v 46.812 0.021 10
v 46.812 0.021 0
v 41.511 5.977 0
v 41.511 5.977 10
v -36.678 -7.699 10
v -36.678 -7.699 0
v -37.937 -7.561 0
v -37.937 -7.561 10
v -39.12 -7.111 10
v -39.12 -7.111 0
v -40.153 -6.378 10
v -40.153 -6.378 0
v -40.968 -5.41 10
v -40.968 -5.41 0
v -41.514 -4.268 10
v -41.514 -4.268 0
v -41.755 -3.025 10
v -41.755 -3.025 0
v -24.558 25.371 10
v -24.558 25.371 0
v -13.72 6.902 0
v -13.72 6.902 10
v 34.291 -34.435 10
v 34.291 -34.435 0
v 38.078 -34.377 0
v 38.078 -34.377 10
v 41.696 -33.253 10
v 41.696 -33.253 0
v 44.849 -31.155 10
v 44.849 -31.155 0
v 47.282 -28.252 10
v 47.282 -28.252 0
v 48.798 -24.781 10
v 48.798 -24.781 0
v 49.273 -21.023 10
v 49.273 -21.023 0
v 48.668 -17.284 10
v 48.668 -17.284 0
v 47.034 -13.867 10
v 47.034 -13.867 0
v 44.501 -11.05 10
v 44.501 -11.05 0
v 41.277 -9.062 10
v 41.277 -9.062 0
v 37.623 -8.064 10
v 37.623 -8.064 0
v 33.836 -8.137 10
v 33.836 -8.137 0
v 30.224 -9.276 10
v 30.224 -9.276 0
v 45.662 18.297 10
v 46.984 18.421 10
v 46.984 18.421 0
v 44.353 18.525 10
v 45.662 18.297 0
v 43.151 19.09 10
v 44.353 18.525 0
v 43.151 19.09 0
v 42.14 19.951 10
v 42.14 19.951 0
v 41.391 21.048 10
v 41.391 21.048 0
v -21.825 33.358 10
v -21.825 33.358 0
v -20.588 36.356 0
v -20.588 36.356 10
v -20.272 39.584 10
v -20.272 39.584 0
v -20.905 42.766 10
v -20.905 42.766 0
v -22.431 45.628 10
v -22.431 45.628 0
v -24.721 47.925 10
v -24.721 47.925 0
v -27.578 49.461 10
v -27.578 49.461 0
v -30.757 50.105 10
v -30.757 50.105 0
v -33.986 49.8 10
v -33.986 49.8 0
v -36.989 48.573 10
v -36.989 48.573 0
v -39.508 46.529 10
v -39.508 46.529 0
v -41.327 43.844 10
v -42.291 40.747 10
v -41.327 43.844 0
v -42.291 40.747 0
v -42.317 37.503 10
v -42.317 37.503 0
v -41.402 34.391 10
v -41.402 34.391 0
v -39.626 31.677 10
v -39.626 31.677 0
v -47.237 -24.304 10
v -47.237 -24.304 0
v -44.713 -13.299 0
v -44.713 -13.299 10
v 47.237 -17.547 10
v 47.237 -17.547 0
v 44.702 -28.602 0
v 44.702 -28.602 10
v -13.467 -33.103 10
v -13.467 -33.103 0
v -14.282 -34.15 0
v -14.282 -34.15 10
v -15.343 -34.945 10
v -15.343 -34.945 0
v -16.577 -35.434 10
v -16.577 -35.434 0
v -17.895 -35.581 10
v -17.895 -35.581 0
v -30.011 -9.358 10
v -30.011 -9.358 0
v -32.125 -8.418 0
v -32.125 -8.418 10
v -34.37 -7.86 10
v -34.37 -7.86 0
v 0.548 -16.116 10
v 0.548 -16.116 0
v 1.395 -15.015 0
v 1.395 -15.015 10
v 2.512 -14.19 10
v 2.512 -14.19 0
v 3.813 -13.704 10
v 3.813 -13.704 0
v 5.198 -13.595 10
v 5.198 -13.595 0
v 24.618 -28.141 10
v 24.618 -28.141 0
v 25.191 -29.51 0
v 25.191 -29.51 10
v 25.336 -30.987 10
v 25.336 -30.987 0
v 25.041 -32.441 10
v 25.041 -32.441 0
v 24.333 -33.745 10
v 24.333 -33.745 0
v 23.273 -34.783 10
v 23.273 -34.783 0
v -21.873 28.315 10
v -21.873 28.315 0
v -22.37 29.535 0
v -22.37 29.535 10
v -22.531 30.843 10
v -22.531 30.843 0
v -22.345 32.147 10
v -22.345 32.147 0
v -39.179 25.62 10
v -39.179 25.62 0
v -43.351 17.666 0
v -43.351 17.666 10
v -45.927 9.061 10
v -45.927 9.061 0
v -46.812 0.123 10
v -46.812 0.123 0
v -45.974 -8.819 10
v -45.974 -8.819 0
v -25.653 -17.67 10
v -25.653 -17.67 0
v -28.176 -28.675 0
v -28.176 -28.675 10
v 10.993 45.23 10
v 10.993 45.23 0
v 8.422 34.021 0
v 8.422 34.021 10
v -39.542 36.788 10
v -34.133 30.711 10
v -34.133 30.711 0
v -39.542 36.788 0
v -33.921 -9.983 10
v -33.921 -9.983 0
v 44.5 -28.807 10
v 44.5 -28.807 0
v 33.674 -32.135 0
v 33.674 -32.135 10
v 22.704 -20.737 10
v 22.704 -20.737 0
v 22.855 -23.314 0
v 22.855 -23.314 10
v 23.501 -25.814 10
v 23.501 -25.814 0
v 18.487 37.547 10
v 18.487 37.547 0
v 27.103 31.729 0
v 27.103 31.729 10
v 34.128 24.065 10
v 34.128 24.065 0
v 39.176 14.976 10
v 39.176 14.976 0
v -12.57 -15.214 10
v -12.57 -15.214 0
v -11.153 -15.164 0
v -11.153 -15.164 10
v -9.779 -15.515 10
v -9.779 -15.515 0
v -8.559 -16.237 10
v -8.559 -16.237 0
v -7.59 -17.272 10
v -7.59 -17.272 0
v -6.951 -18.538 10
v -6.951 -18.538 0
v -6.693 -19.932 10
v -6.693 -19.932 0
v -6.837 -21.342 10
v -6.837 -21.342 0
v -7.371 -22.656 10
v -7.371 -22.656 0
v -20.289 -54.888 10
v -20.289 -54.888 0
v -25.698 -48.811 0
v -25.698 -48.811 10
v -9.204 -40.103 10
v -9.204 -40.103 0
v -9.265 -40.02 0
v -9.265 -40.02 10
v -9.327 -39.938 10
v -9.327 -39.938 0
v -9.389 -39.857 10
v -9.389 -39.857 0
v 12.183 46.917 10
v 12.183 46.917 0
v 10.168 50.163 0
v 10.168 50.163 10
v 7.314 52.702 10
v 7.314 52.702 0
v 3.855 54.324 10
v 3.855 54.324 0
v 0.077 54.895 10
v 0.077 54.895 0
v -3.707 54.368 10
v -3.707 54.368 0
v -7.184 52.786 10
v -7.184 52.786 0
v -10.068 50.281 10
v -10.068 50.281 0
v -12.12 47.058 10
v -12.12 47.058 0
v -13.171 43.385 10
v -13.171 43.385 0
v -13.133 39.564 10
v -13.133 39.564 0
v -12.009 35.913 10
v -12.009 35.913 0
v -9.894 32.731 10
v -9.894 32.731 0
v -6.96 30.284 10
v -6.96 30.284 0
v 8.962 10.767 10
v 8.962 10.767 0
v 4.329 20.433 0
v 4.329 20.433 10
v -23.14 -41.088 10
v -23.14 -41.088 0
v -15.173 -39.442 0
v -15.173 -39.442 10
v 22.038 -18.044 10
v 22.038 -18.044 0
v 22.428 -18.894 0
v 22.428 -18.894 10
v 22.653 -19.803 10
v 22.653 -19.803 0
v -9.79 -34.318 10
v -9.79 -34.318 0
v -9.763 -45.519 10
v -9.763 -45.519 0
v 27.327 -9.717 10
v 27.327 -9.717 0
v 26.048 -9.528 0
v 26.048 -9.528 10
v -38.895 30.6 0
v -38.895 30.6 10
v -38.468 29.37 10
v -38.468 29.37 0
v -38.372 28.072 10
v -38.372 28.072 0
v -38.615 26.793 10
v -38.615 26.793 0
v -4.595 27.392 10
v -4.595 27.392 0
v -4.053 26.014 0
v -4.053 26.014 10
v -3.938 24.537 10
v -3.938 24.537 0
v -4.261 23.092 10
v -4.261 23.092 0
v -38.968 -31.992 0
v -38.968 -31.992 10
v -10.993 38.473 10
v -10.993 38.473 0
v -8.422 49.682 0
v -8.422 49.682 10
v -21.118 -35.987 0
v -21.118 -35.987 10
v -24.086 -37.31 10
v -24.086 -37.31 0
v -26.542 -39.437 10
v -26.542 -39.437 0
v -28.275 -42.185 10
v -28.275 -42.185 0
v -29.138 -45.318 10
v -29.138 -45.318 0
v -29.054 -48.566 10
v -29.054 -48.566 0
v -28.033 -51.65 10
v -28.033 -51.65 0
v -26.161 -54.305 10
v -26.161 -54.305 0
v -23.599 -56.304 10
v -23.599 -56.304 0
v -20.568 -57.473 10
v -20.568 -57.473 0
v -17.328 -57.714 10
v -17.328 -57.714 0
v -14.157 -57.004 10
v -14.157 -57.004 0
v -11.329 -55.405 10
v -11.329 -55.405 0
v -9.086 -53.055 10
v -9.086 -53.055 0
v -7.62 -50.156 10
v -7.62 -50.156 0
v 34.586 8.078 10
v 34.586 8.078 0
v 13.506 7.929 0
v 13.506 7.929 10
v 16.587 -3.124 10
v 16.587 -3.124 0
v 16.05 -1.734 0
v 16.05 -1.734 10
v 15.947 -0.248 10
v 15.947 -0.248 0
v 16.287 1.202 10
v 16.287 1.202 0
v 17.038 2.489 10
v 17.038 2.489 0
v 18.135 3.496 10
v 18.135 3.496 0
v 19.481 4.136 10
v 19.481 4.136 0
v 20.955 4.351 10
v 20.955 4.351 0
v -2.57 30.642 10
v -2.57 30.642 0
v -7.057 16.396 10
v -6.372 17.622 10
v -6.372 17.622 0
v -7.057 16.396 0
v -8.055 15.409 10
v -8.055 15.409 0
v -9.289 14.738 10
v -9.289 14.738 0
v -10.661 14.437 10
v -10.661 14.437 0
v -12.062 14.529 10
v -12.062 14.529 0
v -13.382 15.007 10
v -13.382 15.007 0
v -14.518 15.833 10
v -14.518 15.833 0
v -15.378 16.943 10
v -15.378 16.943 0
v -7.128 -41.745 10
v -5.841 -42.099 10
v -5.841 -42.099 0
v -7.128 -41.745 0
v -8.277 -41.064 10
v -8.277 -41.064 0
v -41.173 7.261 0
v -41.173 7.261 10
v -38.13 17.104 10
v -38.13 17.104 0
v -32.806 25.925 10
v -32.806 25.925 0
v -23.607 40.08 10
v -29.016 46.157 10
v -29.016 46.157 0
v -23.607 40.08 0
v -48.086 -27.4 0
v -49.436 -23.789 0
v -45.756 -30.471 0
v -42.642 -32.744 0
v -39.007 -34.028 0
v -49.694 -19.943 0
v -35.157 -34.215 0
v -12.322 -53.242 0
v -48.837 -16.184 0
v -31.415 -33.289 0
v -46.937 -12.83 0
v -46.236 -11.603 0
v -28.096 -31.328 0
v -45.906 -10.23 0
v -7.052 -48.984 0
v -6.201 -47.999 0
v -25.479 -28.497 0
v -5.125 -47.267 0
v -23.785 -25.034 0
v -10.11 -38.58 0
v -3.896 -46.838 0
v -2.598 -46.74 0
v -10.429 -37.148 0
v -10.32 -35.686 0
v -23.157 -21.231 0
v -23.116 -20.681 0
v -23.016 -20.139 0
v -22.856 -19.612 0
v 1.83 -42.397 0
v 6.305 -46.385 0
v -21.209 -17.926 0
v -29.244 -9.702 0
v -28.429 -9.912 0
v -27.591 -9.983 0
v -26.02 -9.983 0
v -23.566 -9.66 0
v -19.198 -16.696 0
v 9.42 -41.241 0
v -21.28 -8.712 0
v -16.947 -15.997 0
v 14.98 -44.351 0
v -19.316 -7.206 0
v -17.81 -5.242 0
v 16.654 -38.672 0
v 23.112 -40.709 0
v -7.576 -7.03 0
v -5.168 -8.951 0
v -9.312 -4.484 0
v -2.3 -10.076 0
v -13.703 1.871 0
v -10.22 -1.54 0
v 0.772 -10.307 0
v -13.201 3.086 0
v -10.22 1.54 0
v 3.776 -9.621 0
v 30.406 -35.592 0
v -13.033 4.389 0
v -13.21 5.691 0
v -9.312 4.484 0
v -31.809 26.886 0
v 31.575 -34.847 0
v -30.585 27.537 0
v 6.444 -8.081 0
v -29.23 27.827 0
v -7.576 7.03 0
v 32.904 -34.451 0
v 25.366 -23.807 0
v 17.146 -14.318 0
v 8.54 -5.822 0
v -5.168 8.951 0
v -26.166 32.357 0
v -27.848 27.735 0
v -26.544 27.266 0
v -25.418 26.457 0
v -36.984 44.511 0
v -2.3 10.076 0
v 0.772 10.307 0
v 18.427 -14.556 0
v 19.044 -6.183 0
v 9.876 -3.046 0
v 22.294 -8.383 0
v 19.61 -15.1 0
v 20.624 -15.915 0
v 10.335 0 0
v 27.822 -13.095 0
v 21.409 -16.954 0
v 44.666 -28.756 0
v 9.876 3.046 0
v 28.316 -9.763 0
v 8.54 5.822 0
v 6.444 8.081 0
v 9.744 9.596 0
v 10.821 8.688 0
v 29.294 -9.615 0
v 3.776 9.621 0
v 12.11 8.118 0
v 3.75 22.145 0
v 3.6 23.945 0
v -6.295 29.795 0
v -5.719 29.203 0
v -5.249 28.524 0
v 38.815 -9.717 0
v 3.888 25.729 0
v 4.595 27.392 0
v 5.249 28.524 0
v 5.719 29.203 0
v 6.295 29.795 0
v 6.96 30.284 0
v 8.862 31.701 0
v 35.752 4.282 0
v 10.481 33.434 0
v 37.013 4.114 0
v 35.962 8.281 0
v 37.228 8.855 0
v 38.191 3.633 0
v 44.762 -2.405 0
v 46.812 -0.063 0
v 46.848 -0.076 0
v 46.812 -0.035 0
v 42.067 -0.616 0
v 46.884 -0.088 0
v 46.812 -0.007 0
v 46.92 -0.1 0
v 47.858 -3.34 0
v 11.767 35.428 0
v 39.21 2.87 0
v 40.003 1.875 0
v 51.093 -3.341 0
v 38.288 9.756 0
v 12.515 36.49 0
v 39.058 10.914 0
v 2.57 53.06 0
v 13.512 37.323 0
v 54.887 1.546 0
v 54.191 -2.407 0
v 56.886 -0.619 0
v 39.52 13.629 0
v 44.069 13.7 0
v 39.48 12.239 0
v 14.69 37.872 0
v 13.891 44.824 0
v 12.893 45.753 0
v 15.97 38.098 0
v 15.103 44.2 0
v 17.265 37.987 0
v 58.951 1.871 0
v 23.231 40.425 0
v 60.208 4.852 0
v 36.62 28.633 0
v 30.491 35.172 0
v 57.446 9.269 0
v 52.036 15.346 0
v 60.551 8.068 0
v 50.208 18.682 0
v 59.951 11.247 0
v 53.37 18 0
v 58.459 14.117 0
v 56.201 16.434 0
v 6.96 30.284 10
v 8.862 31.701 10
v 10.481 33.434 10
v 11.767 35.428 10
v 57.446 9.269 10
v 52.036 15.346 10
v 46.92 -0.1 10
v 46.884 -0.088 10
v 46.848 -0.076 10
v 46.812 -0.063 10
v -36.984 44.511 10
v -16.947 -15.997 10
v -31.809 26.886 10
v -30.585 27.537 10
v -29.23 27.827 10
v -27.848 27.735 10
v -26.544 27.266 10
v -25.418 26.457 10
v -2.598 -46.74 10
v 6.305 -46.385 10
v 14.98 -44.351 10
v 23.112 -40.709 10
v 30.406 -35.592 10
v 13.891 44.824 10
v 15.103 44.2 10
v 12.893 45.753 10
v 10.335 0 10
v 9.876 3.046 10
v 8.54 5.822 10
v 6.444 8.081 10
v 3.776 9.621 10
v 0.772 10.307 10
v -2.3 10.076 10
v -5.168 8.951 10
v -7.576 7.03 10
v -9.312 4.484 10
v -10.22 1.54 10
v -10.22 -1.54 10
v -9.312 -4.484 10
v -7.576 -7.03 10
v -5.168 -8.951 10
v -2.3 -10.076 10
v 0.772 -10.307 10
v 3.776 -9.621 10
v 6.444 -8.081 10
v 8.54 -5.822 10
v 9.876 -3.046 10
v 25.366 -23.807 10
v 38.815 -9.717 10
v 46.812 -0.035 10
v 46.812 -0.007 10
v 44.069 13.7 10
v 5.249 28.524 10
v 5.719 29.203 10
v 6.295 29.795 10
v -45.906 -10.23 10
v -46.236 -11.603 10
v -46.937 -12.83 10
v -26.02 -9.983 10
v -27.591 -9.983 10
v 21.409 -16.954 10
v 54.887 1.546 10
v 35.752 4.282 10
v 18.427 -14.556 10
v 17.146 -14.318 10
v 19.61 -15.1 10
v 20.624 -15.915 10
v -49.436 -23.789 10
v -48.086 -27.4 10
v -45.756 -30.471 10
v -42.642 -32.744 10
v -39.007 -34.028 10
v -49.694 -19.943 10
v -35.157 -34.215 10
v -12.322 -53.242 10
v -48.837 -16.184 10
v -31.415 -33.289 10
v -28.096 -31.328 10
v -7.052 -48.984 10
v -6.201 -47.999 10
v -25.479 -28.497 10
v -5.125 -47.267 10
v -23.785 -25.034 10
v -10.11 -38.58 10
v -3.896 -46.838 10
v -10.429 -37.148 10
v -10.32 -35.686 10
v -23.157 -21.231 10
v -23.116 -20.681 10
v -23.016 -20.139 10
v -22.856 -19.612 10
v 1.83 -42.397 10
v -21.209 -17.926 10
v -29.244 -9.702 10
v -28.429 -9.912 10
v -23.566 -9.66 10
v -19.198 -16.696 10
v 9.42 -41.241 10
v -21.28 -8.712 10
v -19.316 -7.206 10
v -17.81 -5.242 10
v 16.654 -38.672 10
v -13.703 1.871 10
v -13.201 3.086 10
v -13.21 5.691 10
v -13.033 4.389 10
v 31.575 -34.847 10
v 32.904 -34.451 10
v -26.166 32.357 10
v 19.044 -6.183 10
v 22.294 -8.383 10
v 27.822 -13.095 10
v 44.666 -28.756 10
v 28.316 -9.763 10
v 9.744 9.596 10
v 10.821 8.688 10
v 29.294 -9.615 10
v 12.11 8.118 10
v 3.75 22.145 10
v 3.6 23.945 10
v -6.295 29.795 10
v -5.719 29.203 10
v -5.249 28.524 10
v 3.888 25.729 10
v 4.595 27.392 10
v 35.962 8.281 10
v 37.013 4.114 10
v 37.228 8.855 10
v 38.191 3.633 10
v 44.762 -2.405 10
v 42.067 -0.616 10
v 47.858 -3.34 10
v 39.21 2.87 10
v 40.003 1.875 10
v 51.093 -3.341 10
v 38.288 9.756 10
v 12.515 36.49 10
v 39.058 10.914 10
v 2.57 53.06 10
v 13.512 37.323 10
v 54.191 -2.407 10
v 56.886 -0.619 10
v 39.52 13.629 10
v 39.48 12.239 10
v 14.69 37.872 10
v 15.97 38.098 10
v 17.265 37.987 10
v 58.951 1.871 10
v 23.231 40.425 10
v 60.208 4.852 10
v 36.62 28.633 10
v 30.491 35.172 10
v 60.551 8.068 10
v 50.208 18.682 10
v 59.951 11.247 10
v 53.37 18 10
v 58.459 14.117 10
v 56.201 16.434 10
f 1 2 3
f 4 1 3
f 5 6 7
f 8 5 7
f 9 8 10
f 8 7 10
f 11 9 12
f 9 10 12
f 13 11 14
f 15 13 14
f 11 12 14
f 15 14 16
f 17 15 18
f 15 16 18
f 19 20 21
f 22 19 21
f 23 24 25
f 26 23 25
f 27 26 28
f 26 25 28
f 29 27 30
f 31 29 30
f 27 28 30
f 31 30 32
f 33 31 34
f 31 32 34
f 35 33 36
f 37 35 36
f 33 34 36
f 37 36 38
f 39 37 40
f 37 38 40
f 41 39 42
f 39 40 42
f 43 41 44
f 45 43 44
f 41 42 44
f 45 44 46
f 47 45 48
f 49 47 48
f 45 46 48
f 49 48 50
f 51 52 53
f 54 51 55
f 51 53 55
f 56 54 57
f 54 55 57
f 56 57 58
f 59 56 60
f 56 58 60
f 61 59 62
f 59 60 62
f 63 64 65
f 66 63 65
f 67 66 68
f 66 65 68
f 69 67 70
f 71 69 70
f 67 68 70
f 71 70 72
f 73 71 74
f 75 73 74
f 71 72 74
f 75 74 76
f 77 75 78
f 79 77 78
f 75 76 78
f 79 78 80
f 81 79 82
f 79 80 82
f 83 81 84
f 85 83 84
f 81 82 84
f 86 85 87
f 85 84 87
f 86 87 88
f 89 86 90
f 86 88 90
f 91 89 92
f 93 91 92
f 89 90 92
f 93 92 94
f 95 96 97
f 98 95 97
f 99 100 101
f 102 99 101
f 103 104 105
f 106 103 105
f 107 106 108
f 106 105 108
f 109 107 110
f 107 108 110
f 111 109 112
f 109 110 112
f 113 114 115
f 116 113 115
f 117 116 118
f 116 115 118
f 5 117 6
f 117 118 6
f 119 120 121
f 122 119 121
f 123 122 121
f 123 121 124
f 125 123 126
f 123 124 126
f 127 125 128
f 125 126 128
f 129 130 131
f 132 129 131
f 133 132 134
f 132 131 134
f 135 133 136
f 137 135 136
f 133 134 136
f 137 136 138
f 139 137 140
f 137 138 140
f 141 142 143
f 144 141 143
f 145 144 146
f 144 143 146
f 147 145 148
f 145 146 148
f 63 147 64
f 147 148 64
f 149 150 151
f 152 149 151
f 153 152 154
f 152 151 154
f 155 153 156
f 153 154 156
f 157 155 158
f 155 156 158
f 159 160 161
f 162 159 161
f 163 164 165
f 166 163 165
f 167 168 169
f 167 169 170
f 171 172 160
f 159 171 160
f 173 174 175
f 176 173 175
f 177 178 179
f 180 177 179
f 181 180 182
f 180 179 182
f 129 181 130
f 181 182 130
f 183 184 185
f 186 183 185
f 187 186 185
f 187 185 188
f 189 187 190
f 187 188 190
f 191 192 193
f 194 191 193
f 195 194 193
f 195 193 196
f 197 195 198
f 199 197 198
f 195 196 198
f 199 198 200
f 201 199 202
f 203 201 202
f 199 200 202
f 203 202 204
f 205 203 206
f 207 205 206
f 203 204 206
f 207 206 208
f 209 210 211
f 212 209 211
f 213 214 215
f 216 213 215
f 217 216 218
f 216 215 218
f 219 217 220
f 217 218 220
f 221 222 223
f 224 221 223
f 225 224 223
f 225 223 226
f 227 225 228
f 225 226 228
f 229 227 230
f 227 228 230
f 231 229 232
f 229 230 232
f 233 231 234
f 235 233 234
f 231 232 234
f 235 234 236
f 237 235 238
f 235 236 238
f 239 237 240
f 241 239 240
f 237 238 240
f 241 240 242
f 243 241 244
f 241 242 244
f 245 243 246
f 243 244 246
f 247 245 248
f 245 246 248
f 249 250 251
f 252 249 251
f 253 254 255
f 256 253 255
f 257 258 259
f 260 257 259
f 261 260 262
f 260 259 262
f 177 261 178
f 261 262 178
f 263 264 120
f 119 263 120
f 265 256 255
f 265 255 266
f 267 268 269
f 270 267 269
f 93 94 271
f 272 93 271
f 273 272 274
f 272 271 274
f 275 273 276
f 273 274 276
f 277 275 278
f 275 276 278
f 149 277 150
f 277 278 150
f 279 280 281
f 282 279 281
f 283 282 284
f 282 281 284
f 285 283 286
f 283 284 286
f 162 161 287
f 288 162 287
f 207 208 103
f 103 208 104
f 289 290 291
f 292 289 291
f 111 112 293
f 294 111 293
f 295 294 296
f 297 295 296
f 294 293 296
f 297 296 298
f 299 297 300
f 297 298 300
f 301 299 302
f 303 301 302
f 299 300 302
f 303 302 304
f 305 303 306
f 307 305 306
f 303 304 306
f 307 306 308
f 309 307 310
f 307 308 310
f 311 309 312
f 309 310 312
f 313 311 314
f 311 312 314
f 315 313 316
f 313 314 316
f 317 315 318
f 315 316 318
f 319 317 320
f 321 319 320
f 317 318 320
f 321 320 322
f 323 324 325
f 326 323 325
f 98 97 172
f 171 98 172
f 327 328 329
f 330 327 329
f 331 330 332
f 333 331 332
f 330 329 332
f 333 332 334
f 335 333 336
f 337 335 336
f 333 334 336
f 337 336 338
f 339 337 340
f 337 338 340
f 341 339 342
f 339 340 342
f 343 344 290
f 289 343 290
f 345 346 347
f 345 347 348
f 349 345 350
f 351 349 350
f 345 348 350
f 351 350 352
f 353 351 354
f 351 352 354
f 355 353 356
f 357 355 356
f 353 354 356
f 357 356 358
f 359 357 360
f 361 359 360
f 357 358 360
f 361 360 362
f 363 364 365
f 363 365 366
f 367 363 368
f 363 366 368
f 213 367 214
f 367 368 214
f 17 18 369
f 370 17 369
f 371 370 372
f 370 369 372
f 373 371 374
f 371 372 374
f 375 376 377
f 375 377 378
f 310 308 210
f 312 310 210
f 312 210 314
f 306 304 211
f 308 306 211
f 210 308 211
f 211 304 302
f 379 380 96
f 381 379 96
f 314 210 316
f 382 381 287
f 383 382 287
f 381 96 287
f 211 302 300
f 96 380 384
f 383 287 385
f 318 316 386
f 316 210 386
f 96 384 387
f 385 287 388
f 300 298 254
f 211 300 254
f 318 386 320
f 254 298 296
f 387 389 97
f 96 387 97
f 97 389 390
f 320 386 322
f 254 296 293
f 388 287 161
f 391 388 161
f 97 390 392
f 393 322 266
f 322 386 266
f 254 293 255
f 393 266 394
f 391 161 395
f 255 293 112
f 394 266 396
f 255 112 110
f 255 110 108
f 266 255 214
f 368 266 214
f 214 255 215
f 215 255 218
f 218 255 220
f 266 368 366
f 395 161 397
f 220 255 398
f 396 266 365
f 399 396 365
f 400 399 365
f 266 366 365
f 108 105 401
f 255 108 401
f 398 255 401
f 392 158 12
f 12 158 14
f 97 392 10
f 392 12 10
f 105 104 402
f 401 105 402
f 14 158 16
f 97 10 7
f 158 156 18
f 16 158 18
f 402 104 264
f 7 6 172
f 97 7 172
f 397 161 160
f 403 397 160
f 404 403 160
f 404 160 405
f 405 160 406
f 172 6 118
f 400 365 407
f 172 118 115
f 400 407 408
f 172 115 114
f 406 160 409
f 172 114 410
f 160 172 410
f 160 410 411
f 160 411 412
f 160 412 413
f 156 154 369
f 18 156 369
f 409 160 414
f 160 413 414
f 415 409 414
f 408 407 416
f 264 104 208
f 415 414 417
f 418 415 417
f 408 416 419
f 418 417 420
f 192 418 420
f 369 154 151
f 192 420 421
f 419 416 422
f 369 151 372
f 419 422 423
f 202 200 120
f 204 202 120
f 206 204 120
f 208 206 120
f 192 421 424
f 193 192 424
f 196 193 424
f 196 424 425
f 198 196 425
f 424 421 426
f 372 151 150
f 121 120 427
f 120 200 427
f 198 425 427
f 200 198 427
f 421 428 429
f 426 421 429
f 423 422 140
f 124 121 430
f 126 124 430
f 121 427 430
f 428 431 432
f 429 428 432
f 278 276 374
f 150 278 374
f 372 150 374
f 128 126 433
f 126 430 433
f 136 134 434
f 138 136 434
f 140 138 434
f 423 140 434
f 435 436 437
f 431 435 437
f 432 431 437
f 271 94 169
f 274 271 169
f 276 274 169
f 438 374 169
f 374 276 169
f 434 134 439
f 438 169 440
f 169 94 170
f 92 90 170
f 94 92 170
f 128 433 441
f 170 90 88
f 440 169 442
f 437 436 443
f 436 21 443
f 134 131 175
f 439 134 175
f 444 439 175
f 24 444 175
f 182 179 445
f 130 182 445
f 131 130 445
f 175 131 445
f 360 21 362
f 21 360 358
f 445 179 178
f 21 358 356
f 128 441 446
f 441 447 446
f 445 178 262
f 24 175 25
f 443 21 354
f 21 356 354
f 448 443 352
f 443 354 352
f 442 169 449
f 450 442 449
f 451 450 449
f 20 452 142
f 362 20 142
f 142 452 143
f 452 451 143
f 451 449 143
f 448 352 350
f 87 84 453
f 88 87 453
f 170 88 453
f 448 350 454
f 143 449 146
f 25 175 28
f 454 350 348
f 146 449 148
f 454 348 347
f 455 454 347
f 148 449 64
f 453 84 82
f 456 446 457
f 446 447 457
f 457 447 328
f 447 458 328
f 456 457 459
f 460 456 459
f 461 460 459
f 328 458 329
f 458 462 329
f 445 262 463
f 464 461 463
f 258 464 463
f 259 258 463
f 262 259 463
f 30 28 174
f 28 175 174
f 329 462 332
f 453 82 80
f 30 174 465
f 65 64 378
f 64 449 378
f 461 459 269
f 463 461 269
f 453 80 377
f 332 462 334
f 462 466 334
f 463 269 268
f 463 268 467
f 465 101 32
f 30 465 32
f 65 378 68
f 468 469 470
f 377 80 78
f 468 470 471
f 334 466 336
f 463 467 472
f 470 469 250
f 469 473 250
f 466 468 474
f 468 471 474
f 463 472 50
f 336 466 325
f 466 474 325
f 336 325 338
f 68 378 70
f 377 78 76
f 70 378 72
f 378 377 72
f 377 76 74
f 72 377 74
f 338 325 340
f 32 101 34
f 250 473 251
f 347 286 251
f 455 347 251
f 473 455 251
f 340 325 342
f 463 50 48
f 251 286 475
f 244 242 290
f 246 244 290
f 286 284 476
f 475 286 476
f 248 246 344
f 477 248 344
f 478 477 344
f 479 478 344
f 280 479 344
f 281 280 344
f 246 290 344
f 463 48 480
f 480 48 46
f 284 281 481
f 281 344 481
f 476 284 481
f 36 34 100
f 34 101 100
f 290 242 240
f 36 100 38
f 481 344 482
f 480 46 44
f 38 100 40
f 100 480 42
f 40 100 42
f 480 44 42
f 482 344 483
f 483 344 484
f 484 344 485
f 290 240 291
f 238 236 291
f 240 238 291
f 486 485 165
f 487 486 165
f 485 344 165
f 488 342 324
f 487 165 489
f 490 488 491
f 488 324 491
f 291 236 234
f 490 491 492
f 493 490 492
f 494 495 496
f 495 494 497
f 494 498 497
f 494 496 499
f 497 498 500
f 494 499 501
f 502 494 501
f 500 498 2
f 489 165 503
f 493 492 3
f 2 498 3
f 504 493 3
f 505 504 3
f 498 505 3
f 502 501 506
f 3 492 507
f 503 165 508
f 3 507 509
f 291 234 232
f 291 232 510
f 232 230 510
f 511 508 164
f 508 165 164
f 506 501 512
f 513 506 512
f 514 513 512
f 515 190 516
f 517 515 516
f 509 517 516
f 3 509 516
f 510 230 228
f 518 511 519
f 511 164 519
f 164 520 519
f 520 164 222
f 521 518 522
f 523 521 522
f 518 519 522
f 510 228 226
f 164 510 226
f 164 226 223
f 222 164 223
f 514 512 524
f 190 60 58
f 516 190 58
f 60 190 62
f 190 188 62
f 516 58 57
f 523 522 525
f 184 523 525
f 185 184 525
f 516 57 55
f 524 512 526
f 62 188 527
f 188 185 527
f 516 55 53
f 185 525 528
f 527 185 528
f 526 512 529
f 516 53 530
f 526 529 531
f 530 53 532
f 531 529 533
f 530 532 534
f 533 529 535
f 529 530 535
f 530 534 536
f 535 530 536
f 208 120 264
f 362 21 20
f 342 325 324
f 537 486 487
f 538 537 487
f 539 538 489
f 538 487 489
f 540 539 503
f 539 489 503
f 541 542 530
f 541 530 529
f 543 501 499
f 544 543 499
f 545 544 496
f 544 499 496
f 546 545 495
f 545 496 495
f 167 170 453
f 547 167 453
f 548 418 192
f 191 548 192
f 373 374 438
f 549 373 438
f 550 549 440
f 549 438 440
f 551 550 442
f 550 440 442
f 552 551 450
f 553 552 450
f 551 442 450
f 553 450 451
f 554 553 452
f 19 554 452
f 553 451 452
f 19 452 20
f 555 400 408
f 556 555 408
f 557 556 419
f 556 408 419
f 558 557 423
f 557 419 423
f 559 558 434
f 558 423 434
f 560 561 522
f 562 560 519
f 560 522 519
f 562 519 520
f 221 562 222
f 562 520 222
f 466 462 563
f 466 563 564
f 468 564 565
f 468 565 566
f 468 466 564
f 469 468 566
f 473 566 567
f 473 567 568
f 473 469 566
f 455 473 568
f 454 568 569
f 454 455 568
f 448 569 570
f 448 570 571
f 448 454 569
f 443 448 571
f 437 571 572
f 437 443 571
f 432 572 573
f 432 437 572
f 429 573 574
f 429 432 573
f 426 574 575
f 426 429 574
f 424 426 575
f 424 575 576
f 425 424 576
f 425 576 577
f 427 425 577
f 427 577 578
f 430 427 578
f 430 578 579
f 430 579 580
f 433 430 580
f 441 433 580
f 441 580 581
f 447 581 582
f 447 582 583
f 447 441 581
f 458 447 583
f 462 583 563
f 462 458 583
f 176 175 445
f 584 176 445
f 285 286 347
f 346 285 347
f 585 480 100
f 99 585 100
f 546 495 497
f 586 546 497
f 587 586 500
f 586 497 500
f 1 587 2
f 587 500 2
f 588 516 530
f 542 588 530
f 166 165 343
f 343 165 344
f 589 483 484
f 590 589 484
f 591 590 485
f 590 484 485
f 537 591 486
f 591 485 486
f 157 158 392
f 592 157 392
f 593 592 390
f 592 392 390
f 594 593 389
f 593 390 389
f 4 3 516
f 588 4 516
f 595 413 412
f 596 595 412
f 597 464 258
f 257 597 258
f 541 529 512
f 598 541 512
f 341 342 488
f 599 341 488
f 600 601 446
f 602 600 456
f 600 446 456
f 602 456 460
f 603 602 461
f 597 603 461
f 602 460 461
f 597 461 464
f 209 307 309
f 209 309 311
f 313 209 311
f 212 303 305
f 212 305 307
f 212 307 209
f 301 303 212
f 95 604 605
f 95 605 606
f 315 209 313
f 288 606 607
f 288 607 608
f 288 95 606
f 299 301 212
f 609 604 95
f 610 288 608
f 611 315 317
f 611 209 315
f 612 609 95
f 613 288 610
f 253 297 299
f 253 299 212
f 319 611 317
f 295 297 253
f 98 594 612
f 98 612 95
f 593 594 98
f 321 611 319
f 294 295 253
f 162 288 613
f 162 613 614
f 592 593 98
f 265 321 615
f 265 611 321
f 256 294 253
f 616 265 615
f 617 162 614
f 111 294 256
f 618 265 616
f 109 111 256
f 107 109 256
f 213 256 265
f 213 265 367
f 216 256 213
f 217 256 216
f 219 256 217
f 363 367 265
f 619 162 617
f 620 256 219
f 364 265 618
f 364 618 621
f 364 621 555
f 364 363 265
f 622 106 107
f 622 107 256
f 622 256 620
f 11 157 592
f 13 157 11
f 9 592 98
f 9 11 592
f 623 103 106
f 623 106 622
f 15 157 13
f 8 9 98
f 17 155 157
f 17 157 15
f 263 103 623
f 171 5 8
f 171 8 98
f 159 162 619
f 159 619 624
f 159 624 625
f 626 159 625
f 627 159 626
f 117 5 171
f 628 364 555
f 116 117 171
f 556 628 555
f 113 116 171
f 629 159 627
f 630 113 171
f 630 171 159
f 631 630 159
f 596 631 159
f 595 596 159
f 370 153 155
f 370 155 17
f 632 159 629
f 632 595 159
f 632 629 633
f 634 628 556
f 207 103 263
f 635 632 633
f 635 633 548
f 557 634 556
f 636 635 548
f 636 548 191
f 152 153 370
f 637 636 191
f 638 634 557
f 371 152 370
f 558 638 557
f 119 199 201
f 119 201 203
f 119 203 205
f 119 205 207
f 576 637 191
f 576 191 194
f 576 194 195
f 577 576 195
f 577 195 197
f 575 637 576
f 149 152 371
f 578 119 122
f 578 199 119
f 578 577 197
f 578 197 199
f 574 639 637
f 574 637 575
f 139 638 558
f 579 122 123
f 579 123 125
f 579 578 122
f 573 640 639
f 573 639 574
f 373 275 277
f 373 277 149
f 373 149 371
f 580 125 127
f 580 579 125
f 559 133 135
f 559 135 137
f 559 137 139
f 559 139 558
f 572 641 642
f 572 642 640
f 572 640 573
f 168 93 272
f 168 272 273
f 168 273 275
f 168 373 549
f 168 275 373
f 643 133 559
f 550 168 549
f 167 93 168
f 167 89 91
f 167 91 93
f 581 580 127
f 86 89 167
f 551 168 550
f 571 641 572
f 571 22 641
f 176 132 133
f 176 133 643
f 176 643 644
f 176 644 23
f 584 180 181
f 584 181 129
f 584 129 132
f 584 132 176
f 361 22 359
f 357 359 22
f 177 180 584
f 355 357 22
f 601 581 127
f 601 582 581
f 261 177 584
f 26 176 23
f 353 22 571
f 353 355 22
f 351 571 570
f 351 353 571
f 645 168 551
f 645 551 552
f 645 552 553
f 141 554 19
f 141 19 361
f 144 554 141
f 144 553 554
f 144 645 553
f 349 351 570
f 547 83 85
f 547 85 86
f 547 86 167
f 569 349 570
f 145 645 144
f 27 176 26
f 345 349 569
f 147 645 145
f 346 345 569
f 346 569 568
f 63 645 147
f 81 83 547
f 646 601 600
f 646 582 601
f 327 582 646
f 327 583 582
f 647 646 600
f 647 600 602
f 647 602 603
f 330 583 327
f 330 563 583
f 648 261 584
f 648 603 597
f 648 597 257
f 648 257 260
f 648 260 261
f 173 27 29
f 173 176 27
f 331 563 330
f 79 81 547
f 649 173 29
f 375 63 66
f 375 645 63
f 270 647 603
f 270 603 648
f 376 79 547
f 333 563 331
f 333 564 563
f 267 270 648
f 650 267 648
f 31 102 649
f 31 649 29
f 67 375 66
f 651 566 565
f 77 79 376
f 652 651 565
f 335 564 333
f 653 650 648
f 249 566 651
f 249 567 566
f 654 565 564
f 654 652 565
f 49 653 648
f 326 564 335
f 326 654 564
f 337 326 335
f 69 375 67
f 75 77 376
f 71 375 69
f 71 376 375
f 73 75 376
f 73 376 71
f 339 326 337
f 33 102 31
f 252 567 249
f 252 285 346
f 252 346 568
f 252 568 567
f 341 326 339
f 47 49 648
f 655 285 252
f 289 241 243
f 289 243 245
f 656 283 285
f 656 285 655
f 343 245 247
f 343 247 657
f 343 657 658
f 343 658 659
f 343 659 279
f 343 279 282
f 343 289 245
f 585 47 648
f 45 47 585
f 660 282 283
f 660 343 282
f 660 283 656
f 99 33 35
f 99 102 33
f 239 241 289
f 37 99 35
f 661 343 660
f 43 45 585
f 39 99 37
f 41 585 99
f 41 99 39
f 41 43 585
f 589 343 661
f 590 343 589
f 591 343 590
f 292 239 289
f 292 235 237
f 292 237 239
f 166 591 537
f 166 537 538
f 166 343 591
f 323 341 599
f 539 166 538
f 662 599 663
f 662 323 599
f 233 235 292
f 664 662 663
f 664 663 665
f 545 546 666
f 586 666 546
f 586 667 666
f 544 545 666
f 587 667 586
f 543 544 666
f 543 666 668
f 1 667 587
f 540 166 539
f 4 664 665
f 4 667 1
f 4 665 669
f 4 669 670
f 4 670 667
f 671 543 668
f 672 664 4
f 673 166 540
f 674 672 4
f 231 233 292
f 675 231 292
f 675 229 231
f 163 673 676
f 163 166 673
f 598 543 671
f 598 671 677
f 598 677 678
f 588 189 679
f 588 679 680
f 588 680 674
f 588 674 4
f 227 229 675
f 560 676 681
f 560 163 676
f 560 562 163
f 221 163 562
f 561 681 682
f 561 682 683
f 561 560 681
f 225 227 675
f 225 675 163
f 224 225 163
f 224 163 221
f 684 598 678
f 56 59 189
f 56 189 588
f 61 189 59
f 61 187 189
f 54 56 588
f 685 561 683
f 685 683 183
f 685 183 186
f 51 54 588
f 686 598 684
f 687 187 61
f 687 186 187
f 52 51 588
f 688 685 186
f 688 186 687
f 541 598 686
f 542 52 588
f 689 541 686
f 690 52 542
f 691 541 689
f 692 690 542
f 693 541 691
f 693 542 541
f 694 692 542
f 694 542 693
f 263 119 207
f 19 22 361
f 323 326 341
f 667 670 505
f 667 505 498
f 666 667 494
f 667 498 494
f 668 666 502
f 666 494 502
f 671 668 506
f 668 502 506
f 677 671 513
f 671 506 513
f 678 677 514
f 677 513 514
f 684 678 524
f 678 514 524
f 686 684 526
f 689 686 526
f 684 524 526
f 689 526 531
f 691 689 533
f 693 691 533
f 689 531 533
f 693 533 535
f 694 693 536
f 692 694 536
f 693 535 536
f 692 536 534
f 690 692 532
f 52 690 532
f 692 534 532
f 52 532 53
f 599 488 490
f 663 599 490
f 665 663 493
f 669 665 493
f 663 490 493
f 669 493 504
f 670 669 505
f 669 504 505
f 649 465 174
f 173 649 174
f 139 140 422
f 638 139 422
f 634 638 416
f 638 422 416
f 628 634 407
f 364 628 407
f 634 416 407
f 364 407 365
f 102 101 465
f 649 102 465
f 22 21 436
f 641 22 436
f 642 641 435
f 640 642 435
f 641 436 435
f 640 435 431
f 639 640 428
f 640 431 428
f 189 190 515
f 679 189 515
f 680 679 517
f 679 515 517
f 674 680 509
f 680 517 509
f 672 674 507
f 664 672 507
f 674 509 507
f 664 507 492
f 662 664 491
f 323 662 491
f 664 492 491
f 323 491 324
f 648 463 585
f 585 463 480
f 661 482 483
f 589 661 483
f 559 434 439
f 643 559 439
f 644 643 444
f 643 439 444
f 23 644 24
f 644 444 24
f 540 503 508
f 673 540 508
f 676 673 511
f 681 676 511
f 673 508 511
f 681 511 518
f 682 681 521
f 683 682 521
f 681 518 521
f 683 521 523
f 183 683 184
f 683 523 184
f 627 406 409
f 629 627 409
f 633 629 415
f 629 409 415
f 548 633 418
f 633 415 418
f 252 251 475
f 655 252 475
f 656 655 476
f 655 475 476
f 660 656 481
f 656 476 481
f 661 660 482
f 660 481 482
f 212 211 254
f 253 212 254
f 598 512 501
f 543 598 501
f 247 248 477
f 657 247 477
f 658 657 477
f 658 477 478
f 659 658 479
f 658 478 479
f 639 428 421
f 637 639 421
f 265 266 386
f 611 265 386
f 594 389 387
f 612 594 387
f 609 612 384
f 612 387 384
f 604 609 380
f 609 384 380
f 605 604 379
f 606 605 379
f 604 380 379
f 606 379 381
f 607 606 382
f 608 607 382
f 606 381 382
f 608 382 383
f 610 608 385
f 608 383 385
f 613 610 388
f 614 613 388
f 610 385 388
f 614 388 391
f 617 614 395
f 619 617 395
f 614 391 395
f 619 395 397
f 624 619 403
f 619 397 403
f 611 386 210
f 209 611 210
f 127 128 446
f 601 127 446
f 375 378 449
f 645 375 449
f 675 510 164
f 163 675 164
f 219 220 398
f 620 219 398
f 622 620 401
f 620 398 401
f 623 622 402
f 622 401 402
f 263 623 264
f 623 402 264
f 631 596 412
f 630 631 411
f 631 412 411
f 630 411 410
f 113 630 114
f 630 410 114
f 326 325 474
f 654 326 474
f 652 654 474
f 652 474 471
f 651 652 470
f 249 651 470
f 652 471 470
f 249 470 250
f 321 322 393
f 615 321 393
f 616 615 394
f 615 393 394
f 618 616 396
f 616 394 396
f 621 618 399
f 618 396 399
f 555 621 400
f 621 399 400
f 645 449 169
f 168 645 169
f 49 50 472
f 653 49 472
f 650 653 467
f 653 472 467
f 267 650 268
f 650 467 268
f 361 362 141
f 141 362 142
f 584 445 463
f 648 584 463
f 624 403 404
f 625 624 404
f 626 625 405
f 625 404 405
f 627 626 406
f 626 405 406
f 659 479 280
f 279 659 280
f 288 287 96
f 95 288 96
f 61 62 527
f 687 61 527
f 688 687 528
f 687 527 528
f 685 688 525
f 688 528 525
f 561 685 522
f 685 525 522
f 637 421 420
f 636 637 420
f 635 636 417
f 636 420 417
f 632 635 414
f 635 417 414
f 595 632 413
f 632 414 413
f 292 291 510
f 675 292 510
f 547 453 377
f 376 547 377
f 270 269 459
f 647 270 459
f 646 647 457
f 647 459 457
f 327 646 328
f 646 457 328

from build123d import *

# Parameters (mm, degrees)
F0_R     = 10.3354497049
F1_DEPTH = 10


with BuildPart() as f1:
    # F0 (on Top) → F1 (new body)
    with BuildSketch(Plane.XY):
        with BuildLine():
            ThreePointArc((26.0476715205, -9.5277688633), (20.5866821195, -7.4048691039), (16.5865343387, -3.1237563563))
            ThreePointArc((16.5865343387, -3.1237563563), (16.6143313263, 1.8736112558), (20.9546162977, 4.350783452))
            Line((20.9546162977, 4.350783452), (35.7516345046, 4.2815737703))
            ThreePointArc((35.7516345046, 4.2815737703), (38.1912718914, 3.6328944013), (40.0030732107, 1.875057241))
            ThreePointArc((40.0030732107, 1.875057241), (59.6888453726, 3.3154186125), (46.9838539695, 18.4212936265))
            ThreePointArc((46.9838539695, 18.4212936265), (43.7332768295, 18.7671729362), (41.391113059, 21.0475573584))
            ThreePointArc((41.391113059, 21.0475573584), (30.4913773374, 35.1718790284), (15.1030881654, 44.199683734))
            ThreePointArc((15.1030881654, 44.199683734), (13.3602329953, 45.2544090168), (12.1827503516, 46.9167941077))
            ThreePointArc((12.1827503516, 46.9167941077), (-8.7169198304, 51.6376390641), (-6.9602796681, 30.2835573428))
            ThreePointArc((-6.9602796681, 30.2835573428), (-5.9948536036, 29.5104843528), (-5.2487236207, 28.52408718))
            Line((-5.2487236207, 28.52408718), (-4.5951623795, 27.3920859044))
            ThreePointArc((-4.5951623795, 27.3920859044), (-3.9403401472, 25.2797467908), (-4.2607272631, 23.0915692881))
            Line((-4.2607272631, 23.0915692881), (-6.3719962821, 17.6219471616))
            ThreePointArc((-6.3719962821, 17.6219471616), (-10.6605564778, 14.4366215681), (-15.3783311249, 16.9427440847))
            Line((-15.3783311249, 16.9427440847), (-21.8734443287, 28.3151202921))
            ThreePointArc((-21.8734443287, 28.3151202921), (-22.531440873, 30.8428756983), (-21.8249990194, 33.3575221452))
            ThreePointArc((-21.8249990194, 33.3575221452), (-32.3826009658, 50.070876996), (-39.625901643, 31.6770251828))
            ThreePointArc((-39.625901643, 31.6770251828), (-38.3773400055, 28.7239903076), (-39.1790717552, 25.619711432))
            ThreePointArc((-39.1790717552, 25.619711432), (-45.9266907543, 9.0613660016), (-45.9738489372, -8.8189847124))
            ThreePointArc((-45.9738489372, -8.8189847124), (-46.0225178396, -10.9283689132), (-46.9369511167, -12.8298636279))
            ThreePointArc((-46.9369511167, -12.8298636279), (-40.8714994553, -33.5184892265), (-23.1566713845, -21.2305357989))
            ThreePointArc((-23.1566713845, -21.2305357989), (-23.0733624914, -20.408634033), (-22.8558581112, -19.6116680808))
            ThreePointArc((-22.8558581112, -19.6116680808), (-20.2416339534, -17.248733359), (-16.9474626281, -15.9973086803))
            Line((-16.9474626281, -15.9973086803), (-12.5698108847, -15.2138142303))
            ThreePointArc((-12.5698108847, -15.2138142303), (-7.5901456855, -17.2720461747), (-7.3705416357, -22.6558327877))
            Line((-7.3705416357, -22.6558327877), (-13.4673451749, -33.1026572937))
            ThreePointArc((-13.4673451749, -33.1026572937), (-15.3433779099, -34.9453329591), (-17.8949610773, -35.5812384318))
            ThreePointArc((-17.8949610773, -35.5812384318), (-27.1947516812, -53.0465292991), (-7.6201577031, -50.1555500621))
            ThreePointArc((-7.6201577031, -50.1555500621), (-5.6870353017, -47.5977465283), (-2.5977850601, -46.7399271527))
            ThreePointArc((-2.5977850601, -46.7399271527), (14.979861549, -44.3505696179), (30.4063859475, -35.5924285638))
            ThreePointArc((30.4063859475, -35.5924285638), (32.226193311, -34.6022844585), (34.2911475267, -34.4348082622))
            ThreePointArc((34.2911475267, -34.4348082622), (49.1043559344, -19.1319266108), (30.223953434, -9.2759775653))
            ThreePointArc((30.223953434, -9.2759775653), (28.8084467622, -9.7132375899), (27.326945928, -9.7165155971))
            Line((27.326945928, -9.7165155971), (26.0476715205, -9.5277688633))
        make_face()
        Polygon((-25.6983195519, -48.8112031808), (-23.1400125477, -41.0882104714), (-15.1725511659, -39.442272973), (-9.7633967884, -45.5193281841), (-12.3217037926, -53.2423208936), (-20.2891651744, -54.888258392), align=None, mode=Mode.SUBTRACT)
        Polygon((-25.6526473767, -17.6703529021), (-28.1761860468, -28.6749401878), (-38.9682075294, -31.991785235), (-47.2366903419, -24.3040429964), (-44.7131516719, -13.2994557107), (-33.9211301893, -9.9826106636), align=None, mode=Mode.SUBTRACT)
        with BuildLine():
            ThreePointArc((17.1464472205, -14.3181778051), (19.6097516752, -15.0995212956), (21.4092604692, -16.9542812764))
            Line((21.4092604692, -16.9542812764), (22.0381273172, -18.0435106083))
            ThreePointArc((22.0381273172, -18.0435106083), (22.5618213465, -19.3433351078), (22.7042381867, -20.7374357532))
            ThreePointArc((22.7042381867, -20.7374357532), (23.1173853103, -24.5798156567), (24.6184803157, -28.1408952196))
            ThreePointArc((24.6184803157, -28.1408952196), (25.2428792275, -31.7249542816), (23.2729013133, -34.7834735932))
            ThreePointArc((23.2729013133, -34.7834735932), (9.419684867, -41.2411709688), (-5.8406517441, -42.0988351334))
            ThreePointArc((-5.8406517441, -42.0988351334), (-7.725446025, -41.4431302055), (-9.2036800008, -40.1025248397))
            ThreePointArc((-9.2036800008, -40.1025248397), (-9.295625501, -39.9790891343), (-9.3892764279, -39.8569422871))
            ThreePointArc((-9.3892764279, -39.8569422871), (-10.4294976001, -37.1481783868), (-9.7902204963, -34.3178450603))
            Line((-9.7902204963, -34.3178450603), (0.5477905756, -16.116209429))
            ThreePointArc((0.5477905756, -16.116209429), (2.5119825197, -14.1902261445), (5.1976512462, -13.5947052828))
            Line((5.1976512462, -13.5947052828), (17.1464472205, -14.3181778051))
        make_face(mode=Mode.SUBTRACT)
        with BuildLine():
            Line((16.6011031737, -3.1491618567), (16.5626926236, -3.0826328324))
            ThreePointArc((16.5626926236, -3.0826328324), (16.574594931, -3.103205349), (16.5865343387, -3.1237563563))
            ThreePointArc((16.5865343387, -3.1237563563), (16.5938001553, -3.1364697732), (16.6011031737, -3.1491618567))
        make_face(mode=Mode.SUBTRACT)
        Polygon((44.4996077616, -28.8073727903), (33.6737244283, -32.1346250176), (25.3656168325, -23.8068915105), (27.8220380789, -13.0949882861), (38.8145774711, -9.7165155971), (47.2366903419, -17.5470976183), (44.7015978404, -28.6020685768), (44.6662638205, -28.7561523286), align=None, mode=Mode.SUBTRACT)
        with BuildLine():
            ThreePointArc((-17.8096832999, -5.2424840404), (-21.2796968224, -8.7124975629), (-26.0198234456, -9.9826106636))
            Line((-26.0198234456, -9.9826106636), (-27.5911085786, -9.9826106636))
            ThreePointArc((-27.5911085786, -9.9826106636), (-28.8409335841, -9.8238850264), (-30.0114068814, -9.3577856459))
            ThreePointArc((-30.0114068814, -9.3577856459), (-33.2357643816, -8.090181928), (-36.6781903014, -7.6990243375))
            ThreePointArc((-36.6781903014, -7.6990243375), (-40.152524922, -6.3783493463), (-41.7554658188, -3.0248789097))
            ThreePointArc((-41.7554658188, -3.0248789097), (-39.9512896461, 12.2753331327), (-32.80623714, 25.9245003194))
            ThreePointArc((-32.80623714, 25.9245003194), (-28.5358777475, 27.8291904256), (-24.5583425883, 25.3709333601))
            Line((-24.5583425883, 25.3709333601), (-13.7204299658, 6.9015986867))
            ThreePointArc((-13.7204299658, 6.9015986867), (-13.0328237883, 4.3887357815), (-13.7026655941, 1.8710792937))
            Line((-13.7026655941, 1.8710792937), (-17.8096832999, -5.2424840404))
        make_face(mode=Mode.SUBTRACT)
        Circle(F0_R, mode=Mode.SUBTRACT)
        Polygon((-23.6072220849, 40.0795913092), (-26.1655290892, 32.3565985997), (-34.132990471, 30.7106611014), (-39.5421448485, 36.7877163125), (-36.9838378442, 44.510709022), (-29.0163764624, 46.1566465203), align=None, mode=Mode.SUBTRACT)
        Polygon((2.5704265214, 53.060195325), (10.9925393922, 45.2296133038), (8.4221128708, 34.0205585935), (-2.5704265214, 30.6420859044), (-10.9925393922, 38.4726679257), (-8.4221128708, 49.6817226359), align=None, mode=Mode.SUBTRACT)
        with BuildLine():
            ThreePointArc((4.3285128423, 20.4325643906), (3.6004962361, 23.9453268817), (4.5951623795, 27.3920859044))
            Line((4.5951623795, 27.3920859044), (5.2487236207, 28.52408718))
            ThreePointArc((5.2487236207, 28.52408718), (5.9948536036, 29.5104843528), (6.9602796681, 30.2835573428))
            ThreePointArc((6.9602796681, 30.2835573428), (9.71050055, 32.5314875149), (11.7670884139, 35.4275799367))
            ThreePointArc((11.7670884139, 35.4275799367), (14.6903203036, 37.8718936539), (18.4869211069, 37.5466605538))
            ThreePointArc((18.4869211069, 37.5466605538), (30.8412464649, 28.1036186684), (39.1761724906, 14.9761892458))
            ThreePointArc((39.1761724906, 14.9761892458), (38.7132835477, 10.307822352), (34.5859321139, 8.0778255422))
            Line((34.5859321139, 8.0778255422), (13.5057011722, 7.9289416207))
            ThreePointArc((13.5057011722, 7.9289416207), (10.8213953927, 8.6881995171), (8.9616649904, 10.7674717221))
            Line((8.9616649904, 10.7674717221), (4.3285128423, 20.4325643906))
        make_face(mode=Mode.SUBTRACT)
        with BuildLine():
            Line((54.8872223768, 1.5462432454), (46.919760995, -0.099694253))
            ThreePointArc((46.919760995, -0.099694253), (46.8658270284, -0.0816186896), (46.8120207581, -0.0631664804))
            ThreePointArc((46.8120207581, -0.0631664804), (46.8120586965, -0.020929805), (46.8120585264, 0.0213068875))
            Line((46.8120585264, 0.0213068875), (41.5106066175, 5.9773609582))
            Line((41.5106066175, 5.9773609582), (44.0689136218, 13.7003536676))
            Line((44.0689136218, 13.7003536676), (52.0363750036, 15.346291166))
            Line((52.0363750036, 15.346291166), (57.4455293811, 9.2692359549))
            Line((57.4455293811, 9.2692359549), (54.8872223768, 1.5462432454))
        make_face(mode=Mode.SUBTRACT)
        with BuildLine():
            ThreePointArc((16.5865343387, -3.1237563563), (16.574594931, -3.103205349), (16.5626926236, -3.0826328324))
            Line((16.5626926236, -3.0826328324), (16.6011031737, -3.1491618567))
            ThreePointArc((16.6011031737, -3.1491618567), (16.5938001553, -3.1364697732), (16.5865343387, -3.1237563563))
        make_face()
    extrude(amount=F1_DEPTH)


solid = f1.part
